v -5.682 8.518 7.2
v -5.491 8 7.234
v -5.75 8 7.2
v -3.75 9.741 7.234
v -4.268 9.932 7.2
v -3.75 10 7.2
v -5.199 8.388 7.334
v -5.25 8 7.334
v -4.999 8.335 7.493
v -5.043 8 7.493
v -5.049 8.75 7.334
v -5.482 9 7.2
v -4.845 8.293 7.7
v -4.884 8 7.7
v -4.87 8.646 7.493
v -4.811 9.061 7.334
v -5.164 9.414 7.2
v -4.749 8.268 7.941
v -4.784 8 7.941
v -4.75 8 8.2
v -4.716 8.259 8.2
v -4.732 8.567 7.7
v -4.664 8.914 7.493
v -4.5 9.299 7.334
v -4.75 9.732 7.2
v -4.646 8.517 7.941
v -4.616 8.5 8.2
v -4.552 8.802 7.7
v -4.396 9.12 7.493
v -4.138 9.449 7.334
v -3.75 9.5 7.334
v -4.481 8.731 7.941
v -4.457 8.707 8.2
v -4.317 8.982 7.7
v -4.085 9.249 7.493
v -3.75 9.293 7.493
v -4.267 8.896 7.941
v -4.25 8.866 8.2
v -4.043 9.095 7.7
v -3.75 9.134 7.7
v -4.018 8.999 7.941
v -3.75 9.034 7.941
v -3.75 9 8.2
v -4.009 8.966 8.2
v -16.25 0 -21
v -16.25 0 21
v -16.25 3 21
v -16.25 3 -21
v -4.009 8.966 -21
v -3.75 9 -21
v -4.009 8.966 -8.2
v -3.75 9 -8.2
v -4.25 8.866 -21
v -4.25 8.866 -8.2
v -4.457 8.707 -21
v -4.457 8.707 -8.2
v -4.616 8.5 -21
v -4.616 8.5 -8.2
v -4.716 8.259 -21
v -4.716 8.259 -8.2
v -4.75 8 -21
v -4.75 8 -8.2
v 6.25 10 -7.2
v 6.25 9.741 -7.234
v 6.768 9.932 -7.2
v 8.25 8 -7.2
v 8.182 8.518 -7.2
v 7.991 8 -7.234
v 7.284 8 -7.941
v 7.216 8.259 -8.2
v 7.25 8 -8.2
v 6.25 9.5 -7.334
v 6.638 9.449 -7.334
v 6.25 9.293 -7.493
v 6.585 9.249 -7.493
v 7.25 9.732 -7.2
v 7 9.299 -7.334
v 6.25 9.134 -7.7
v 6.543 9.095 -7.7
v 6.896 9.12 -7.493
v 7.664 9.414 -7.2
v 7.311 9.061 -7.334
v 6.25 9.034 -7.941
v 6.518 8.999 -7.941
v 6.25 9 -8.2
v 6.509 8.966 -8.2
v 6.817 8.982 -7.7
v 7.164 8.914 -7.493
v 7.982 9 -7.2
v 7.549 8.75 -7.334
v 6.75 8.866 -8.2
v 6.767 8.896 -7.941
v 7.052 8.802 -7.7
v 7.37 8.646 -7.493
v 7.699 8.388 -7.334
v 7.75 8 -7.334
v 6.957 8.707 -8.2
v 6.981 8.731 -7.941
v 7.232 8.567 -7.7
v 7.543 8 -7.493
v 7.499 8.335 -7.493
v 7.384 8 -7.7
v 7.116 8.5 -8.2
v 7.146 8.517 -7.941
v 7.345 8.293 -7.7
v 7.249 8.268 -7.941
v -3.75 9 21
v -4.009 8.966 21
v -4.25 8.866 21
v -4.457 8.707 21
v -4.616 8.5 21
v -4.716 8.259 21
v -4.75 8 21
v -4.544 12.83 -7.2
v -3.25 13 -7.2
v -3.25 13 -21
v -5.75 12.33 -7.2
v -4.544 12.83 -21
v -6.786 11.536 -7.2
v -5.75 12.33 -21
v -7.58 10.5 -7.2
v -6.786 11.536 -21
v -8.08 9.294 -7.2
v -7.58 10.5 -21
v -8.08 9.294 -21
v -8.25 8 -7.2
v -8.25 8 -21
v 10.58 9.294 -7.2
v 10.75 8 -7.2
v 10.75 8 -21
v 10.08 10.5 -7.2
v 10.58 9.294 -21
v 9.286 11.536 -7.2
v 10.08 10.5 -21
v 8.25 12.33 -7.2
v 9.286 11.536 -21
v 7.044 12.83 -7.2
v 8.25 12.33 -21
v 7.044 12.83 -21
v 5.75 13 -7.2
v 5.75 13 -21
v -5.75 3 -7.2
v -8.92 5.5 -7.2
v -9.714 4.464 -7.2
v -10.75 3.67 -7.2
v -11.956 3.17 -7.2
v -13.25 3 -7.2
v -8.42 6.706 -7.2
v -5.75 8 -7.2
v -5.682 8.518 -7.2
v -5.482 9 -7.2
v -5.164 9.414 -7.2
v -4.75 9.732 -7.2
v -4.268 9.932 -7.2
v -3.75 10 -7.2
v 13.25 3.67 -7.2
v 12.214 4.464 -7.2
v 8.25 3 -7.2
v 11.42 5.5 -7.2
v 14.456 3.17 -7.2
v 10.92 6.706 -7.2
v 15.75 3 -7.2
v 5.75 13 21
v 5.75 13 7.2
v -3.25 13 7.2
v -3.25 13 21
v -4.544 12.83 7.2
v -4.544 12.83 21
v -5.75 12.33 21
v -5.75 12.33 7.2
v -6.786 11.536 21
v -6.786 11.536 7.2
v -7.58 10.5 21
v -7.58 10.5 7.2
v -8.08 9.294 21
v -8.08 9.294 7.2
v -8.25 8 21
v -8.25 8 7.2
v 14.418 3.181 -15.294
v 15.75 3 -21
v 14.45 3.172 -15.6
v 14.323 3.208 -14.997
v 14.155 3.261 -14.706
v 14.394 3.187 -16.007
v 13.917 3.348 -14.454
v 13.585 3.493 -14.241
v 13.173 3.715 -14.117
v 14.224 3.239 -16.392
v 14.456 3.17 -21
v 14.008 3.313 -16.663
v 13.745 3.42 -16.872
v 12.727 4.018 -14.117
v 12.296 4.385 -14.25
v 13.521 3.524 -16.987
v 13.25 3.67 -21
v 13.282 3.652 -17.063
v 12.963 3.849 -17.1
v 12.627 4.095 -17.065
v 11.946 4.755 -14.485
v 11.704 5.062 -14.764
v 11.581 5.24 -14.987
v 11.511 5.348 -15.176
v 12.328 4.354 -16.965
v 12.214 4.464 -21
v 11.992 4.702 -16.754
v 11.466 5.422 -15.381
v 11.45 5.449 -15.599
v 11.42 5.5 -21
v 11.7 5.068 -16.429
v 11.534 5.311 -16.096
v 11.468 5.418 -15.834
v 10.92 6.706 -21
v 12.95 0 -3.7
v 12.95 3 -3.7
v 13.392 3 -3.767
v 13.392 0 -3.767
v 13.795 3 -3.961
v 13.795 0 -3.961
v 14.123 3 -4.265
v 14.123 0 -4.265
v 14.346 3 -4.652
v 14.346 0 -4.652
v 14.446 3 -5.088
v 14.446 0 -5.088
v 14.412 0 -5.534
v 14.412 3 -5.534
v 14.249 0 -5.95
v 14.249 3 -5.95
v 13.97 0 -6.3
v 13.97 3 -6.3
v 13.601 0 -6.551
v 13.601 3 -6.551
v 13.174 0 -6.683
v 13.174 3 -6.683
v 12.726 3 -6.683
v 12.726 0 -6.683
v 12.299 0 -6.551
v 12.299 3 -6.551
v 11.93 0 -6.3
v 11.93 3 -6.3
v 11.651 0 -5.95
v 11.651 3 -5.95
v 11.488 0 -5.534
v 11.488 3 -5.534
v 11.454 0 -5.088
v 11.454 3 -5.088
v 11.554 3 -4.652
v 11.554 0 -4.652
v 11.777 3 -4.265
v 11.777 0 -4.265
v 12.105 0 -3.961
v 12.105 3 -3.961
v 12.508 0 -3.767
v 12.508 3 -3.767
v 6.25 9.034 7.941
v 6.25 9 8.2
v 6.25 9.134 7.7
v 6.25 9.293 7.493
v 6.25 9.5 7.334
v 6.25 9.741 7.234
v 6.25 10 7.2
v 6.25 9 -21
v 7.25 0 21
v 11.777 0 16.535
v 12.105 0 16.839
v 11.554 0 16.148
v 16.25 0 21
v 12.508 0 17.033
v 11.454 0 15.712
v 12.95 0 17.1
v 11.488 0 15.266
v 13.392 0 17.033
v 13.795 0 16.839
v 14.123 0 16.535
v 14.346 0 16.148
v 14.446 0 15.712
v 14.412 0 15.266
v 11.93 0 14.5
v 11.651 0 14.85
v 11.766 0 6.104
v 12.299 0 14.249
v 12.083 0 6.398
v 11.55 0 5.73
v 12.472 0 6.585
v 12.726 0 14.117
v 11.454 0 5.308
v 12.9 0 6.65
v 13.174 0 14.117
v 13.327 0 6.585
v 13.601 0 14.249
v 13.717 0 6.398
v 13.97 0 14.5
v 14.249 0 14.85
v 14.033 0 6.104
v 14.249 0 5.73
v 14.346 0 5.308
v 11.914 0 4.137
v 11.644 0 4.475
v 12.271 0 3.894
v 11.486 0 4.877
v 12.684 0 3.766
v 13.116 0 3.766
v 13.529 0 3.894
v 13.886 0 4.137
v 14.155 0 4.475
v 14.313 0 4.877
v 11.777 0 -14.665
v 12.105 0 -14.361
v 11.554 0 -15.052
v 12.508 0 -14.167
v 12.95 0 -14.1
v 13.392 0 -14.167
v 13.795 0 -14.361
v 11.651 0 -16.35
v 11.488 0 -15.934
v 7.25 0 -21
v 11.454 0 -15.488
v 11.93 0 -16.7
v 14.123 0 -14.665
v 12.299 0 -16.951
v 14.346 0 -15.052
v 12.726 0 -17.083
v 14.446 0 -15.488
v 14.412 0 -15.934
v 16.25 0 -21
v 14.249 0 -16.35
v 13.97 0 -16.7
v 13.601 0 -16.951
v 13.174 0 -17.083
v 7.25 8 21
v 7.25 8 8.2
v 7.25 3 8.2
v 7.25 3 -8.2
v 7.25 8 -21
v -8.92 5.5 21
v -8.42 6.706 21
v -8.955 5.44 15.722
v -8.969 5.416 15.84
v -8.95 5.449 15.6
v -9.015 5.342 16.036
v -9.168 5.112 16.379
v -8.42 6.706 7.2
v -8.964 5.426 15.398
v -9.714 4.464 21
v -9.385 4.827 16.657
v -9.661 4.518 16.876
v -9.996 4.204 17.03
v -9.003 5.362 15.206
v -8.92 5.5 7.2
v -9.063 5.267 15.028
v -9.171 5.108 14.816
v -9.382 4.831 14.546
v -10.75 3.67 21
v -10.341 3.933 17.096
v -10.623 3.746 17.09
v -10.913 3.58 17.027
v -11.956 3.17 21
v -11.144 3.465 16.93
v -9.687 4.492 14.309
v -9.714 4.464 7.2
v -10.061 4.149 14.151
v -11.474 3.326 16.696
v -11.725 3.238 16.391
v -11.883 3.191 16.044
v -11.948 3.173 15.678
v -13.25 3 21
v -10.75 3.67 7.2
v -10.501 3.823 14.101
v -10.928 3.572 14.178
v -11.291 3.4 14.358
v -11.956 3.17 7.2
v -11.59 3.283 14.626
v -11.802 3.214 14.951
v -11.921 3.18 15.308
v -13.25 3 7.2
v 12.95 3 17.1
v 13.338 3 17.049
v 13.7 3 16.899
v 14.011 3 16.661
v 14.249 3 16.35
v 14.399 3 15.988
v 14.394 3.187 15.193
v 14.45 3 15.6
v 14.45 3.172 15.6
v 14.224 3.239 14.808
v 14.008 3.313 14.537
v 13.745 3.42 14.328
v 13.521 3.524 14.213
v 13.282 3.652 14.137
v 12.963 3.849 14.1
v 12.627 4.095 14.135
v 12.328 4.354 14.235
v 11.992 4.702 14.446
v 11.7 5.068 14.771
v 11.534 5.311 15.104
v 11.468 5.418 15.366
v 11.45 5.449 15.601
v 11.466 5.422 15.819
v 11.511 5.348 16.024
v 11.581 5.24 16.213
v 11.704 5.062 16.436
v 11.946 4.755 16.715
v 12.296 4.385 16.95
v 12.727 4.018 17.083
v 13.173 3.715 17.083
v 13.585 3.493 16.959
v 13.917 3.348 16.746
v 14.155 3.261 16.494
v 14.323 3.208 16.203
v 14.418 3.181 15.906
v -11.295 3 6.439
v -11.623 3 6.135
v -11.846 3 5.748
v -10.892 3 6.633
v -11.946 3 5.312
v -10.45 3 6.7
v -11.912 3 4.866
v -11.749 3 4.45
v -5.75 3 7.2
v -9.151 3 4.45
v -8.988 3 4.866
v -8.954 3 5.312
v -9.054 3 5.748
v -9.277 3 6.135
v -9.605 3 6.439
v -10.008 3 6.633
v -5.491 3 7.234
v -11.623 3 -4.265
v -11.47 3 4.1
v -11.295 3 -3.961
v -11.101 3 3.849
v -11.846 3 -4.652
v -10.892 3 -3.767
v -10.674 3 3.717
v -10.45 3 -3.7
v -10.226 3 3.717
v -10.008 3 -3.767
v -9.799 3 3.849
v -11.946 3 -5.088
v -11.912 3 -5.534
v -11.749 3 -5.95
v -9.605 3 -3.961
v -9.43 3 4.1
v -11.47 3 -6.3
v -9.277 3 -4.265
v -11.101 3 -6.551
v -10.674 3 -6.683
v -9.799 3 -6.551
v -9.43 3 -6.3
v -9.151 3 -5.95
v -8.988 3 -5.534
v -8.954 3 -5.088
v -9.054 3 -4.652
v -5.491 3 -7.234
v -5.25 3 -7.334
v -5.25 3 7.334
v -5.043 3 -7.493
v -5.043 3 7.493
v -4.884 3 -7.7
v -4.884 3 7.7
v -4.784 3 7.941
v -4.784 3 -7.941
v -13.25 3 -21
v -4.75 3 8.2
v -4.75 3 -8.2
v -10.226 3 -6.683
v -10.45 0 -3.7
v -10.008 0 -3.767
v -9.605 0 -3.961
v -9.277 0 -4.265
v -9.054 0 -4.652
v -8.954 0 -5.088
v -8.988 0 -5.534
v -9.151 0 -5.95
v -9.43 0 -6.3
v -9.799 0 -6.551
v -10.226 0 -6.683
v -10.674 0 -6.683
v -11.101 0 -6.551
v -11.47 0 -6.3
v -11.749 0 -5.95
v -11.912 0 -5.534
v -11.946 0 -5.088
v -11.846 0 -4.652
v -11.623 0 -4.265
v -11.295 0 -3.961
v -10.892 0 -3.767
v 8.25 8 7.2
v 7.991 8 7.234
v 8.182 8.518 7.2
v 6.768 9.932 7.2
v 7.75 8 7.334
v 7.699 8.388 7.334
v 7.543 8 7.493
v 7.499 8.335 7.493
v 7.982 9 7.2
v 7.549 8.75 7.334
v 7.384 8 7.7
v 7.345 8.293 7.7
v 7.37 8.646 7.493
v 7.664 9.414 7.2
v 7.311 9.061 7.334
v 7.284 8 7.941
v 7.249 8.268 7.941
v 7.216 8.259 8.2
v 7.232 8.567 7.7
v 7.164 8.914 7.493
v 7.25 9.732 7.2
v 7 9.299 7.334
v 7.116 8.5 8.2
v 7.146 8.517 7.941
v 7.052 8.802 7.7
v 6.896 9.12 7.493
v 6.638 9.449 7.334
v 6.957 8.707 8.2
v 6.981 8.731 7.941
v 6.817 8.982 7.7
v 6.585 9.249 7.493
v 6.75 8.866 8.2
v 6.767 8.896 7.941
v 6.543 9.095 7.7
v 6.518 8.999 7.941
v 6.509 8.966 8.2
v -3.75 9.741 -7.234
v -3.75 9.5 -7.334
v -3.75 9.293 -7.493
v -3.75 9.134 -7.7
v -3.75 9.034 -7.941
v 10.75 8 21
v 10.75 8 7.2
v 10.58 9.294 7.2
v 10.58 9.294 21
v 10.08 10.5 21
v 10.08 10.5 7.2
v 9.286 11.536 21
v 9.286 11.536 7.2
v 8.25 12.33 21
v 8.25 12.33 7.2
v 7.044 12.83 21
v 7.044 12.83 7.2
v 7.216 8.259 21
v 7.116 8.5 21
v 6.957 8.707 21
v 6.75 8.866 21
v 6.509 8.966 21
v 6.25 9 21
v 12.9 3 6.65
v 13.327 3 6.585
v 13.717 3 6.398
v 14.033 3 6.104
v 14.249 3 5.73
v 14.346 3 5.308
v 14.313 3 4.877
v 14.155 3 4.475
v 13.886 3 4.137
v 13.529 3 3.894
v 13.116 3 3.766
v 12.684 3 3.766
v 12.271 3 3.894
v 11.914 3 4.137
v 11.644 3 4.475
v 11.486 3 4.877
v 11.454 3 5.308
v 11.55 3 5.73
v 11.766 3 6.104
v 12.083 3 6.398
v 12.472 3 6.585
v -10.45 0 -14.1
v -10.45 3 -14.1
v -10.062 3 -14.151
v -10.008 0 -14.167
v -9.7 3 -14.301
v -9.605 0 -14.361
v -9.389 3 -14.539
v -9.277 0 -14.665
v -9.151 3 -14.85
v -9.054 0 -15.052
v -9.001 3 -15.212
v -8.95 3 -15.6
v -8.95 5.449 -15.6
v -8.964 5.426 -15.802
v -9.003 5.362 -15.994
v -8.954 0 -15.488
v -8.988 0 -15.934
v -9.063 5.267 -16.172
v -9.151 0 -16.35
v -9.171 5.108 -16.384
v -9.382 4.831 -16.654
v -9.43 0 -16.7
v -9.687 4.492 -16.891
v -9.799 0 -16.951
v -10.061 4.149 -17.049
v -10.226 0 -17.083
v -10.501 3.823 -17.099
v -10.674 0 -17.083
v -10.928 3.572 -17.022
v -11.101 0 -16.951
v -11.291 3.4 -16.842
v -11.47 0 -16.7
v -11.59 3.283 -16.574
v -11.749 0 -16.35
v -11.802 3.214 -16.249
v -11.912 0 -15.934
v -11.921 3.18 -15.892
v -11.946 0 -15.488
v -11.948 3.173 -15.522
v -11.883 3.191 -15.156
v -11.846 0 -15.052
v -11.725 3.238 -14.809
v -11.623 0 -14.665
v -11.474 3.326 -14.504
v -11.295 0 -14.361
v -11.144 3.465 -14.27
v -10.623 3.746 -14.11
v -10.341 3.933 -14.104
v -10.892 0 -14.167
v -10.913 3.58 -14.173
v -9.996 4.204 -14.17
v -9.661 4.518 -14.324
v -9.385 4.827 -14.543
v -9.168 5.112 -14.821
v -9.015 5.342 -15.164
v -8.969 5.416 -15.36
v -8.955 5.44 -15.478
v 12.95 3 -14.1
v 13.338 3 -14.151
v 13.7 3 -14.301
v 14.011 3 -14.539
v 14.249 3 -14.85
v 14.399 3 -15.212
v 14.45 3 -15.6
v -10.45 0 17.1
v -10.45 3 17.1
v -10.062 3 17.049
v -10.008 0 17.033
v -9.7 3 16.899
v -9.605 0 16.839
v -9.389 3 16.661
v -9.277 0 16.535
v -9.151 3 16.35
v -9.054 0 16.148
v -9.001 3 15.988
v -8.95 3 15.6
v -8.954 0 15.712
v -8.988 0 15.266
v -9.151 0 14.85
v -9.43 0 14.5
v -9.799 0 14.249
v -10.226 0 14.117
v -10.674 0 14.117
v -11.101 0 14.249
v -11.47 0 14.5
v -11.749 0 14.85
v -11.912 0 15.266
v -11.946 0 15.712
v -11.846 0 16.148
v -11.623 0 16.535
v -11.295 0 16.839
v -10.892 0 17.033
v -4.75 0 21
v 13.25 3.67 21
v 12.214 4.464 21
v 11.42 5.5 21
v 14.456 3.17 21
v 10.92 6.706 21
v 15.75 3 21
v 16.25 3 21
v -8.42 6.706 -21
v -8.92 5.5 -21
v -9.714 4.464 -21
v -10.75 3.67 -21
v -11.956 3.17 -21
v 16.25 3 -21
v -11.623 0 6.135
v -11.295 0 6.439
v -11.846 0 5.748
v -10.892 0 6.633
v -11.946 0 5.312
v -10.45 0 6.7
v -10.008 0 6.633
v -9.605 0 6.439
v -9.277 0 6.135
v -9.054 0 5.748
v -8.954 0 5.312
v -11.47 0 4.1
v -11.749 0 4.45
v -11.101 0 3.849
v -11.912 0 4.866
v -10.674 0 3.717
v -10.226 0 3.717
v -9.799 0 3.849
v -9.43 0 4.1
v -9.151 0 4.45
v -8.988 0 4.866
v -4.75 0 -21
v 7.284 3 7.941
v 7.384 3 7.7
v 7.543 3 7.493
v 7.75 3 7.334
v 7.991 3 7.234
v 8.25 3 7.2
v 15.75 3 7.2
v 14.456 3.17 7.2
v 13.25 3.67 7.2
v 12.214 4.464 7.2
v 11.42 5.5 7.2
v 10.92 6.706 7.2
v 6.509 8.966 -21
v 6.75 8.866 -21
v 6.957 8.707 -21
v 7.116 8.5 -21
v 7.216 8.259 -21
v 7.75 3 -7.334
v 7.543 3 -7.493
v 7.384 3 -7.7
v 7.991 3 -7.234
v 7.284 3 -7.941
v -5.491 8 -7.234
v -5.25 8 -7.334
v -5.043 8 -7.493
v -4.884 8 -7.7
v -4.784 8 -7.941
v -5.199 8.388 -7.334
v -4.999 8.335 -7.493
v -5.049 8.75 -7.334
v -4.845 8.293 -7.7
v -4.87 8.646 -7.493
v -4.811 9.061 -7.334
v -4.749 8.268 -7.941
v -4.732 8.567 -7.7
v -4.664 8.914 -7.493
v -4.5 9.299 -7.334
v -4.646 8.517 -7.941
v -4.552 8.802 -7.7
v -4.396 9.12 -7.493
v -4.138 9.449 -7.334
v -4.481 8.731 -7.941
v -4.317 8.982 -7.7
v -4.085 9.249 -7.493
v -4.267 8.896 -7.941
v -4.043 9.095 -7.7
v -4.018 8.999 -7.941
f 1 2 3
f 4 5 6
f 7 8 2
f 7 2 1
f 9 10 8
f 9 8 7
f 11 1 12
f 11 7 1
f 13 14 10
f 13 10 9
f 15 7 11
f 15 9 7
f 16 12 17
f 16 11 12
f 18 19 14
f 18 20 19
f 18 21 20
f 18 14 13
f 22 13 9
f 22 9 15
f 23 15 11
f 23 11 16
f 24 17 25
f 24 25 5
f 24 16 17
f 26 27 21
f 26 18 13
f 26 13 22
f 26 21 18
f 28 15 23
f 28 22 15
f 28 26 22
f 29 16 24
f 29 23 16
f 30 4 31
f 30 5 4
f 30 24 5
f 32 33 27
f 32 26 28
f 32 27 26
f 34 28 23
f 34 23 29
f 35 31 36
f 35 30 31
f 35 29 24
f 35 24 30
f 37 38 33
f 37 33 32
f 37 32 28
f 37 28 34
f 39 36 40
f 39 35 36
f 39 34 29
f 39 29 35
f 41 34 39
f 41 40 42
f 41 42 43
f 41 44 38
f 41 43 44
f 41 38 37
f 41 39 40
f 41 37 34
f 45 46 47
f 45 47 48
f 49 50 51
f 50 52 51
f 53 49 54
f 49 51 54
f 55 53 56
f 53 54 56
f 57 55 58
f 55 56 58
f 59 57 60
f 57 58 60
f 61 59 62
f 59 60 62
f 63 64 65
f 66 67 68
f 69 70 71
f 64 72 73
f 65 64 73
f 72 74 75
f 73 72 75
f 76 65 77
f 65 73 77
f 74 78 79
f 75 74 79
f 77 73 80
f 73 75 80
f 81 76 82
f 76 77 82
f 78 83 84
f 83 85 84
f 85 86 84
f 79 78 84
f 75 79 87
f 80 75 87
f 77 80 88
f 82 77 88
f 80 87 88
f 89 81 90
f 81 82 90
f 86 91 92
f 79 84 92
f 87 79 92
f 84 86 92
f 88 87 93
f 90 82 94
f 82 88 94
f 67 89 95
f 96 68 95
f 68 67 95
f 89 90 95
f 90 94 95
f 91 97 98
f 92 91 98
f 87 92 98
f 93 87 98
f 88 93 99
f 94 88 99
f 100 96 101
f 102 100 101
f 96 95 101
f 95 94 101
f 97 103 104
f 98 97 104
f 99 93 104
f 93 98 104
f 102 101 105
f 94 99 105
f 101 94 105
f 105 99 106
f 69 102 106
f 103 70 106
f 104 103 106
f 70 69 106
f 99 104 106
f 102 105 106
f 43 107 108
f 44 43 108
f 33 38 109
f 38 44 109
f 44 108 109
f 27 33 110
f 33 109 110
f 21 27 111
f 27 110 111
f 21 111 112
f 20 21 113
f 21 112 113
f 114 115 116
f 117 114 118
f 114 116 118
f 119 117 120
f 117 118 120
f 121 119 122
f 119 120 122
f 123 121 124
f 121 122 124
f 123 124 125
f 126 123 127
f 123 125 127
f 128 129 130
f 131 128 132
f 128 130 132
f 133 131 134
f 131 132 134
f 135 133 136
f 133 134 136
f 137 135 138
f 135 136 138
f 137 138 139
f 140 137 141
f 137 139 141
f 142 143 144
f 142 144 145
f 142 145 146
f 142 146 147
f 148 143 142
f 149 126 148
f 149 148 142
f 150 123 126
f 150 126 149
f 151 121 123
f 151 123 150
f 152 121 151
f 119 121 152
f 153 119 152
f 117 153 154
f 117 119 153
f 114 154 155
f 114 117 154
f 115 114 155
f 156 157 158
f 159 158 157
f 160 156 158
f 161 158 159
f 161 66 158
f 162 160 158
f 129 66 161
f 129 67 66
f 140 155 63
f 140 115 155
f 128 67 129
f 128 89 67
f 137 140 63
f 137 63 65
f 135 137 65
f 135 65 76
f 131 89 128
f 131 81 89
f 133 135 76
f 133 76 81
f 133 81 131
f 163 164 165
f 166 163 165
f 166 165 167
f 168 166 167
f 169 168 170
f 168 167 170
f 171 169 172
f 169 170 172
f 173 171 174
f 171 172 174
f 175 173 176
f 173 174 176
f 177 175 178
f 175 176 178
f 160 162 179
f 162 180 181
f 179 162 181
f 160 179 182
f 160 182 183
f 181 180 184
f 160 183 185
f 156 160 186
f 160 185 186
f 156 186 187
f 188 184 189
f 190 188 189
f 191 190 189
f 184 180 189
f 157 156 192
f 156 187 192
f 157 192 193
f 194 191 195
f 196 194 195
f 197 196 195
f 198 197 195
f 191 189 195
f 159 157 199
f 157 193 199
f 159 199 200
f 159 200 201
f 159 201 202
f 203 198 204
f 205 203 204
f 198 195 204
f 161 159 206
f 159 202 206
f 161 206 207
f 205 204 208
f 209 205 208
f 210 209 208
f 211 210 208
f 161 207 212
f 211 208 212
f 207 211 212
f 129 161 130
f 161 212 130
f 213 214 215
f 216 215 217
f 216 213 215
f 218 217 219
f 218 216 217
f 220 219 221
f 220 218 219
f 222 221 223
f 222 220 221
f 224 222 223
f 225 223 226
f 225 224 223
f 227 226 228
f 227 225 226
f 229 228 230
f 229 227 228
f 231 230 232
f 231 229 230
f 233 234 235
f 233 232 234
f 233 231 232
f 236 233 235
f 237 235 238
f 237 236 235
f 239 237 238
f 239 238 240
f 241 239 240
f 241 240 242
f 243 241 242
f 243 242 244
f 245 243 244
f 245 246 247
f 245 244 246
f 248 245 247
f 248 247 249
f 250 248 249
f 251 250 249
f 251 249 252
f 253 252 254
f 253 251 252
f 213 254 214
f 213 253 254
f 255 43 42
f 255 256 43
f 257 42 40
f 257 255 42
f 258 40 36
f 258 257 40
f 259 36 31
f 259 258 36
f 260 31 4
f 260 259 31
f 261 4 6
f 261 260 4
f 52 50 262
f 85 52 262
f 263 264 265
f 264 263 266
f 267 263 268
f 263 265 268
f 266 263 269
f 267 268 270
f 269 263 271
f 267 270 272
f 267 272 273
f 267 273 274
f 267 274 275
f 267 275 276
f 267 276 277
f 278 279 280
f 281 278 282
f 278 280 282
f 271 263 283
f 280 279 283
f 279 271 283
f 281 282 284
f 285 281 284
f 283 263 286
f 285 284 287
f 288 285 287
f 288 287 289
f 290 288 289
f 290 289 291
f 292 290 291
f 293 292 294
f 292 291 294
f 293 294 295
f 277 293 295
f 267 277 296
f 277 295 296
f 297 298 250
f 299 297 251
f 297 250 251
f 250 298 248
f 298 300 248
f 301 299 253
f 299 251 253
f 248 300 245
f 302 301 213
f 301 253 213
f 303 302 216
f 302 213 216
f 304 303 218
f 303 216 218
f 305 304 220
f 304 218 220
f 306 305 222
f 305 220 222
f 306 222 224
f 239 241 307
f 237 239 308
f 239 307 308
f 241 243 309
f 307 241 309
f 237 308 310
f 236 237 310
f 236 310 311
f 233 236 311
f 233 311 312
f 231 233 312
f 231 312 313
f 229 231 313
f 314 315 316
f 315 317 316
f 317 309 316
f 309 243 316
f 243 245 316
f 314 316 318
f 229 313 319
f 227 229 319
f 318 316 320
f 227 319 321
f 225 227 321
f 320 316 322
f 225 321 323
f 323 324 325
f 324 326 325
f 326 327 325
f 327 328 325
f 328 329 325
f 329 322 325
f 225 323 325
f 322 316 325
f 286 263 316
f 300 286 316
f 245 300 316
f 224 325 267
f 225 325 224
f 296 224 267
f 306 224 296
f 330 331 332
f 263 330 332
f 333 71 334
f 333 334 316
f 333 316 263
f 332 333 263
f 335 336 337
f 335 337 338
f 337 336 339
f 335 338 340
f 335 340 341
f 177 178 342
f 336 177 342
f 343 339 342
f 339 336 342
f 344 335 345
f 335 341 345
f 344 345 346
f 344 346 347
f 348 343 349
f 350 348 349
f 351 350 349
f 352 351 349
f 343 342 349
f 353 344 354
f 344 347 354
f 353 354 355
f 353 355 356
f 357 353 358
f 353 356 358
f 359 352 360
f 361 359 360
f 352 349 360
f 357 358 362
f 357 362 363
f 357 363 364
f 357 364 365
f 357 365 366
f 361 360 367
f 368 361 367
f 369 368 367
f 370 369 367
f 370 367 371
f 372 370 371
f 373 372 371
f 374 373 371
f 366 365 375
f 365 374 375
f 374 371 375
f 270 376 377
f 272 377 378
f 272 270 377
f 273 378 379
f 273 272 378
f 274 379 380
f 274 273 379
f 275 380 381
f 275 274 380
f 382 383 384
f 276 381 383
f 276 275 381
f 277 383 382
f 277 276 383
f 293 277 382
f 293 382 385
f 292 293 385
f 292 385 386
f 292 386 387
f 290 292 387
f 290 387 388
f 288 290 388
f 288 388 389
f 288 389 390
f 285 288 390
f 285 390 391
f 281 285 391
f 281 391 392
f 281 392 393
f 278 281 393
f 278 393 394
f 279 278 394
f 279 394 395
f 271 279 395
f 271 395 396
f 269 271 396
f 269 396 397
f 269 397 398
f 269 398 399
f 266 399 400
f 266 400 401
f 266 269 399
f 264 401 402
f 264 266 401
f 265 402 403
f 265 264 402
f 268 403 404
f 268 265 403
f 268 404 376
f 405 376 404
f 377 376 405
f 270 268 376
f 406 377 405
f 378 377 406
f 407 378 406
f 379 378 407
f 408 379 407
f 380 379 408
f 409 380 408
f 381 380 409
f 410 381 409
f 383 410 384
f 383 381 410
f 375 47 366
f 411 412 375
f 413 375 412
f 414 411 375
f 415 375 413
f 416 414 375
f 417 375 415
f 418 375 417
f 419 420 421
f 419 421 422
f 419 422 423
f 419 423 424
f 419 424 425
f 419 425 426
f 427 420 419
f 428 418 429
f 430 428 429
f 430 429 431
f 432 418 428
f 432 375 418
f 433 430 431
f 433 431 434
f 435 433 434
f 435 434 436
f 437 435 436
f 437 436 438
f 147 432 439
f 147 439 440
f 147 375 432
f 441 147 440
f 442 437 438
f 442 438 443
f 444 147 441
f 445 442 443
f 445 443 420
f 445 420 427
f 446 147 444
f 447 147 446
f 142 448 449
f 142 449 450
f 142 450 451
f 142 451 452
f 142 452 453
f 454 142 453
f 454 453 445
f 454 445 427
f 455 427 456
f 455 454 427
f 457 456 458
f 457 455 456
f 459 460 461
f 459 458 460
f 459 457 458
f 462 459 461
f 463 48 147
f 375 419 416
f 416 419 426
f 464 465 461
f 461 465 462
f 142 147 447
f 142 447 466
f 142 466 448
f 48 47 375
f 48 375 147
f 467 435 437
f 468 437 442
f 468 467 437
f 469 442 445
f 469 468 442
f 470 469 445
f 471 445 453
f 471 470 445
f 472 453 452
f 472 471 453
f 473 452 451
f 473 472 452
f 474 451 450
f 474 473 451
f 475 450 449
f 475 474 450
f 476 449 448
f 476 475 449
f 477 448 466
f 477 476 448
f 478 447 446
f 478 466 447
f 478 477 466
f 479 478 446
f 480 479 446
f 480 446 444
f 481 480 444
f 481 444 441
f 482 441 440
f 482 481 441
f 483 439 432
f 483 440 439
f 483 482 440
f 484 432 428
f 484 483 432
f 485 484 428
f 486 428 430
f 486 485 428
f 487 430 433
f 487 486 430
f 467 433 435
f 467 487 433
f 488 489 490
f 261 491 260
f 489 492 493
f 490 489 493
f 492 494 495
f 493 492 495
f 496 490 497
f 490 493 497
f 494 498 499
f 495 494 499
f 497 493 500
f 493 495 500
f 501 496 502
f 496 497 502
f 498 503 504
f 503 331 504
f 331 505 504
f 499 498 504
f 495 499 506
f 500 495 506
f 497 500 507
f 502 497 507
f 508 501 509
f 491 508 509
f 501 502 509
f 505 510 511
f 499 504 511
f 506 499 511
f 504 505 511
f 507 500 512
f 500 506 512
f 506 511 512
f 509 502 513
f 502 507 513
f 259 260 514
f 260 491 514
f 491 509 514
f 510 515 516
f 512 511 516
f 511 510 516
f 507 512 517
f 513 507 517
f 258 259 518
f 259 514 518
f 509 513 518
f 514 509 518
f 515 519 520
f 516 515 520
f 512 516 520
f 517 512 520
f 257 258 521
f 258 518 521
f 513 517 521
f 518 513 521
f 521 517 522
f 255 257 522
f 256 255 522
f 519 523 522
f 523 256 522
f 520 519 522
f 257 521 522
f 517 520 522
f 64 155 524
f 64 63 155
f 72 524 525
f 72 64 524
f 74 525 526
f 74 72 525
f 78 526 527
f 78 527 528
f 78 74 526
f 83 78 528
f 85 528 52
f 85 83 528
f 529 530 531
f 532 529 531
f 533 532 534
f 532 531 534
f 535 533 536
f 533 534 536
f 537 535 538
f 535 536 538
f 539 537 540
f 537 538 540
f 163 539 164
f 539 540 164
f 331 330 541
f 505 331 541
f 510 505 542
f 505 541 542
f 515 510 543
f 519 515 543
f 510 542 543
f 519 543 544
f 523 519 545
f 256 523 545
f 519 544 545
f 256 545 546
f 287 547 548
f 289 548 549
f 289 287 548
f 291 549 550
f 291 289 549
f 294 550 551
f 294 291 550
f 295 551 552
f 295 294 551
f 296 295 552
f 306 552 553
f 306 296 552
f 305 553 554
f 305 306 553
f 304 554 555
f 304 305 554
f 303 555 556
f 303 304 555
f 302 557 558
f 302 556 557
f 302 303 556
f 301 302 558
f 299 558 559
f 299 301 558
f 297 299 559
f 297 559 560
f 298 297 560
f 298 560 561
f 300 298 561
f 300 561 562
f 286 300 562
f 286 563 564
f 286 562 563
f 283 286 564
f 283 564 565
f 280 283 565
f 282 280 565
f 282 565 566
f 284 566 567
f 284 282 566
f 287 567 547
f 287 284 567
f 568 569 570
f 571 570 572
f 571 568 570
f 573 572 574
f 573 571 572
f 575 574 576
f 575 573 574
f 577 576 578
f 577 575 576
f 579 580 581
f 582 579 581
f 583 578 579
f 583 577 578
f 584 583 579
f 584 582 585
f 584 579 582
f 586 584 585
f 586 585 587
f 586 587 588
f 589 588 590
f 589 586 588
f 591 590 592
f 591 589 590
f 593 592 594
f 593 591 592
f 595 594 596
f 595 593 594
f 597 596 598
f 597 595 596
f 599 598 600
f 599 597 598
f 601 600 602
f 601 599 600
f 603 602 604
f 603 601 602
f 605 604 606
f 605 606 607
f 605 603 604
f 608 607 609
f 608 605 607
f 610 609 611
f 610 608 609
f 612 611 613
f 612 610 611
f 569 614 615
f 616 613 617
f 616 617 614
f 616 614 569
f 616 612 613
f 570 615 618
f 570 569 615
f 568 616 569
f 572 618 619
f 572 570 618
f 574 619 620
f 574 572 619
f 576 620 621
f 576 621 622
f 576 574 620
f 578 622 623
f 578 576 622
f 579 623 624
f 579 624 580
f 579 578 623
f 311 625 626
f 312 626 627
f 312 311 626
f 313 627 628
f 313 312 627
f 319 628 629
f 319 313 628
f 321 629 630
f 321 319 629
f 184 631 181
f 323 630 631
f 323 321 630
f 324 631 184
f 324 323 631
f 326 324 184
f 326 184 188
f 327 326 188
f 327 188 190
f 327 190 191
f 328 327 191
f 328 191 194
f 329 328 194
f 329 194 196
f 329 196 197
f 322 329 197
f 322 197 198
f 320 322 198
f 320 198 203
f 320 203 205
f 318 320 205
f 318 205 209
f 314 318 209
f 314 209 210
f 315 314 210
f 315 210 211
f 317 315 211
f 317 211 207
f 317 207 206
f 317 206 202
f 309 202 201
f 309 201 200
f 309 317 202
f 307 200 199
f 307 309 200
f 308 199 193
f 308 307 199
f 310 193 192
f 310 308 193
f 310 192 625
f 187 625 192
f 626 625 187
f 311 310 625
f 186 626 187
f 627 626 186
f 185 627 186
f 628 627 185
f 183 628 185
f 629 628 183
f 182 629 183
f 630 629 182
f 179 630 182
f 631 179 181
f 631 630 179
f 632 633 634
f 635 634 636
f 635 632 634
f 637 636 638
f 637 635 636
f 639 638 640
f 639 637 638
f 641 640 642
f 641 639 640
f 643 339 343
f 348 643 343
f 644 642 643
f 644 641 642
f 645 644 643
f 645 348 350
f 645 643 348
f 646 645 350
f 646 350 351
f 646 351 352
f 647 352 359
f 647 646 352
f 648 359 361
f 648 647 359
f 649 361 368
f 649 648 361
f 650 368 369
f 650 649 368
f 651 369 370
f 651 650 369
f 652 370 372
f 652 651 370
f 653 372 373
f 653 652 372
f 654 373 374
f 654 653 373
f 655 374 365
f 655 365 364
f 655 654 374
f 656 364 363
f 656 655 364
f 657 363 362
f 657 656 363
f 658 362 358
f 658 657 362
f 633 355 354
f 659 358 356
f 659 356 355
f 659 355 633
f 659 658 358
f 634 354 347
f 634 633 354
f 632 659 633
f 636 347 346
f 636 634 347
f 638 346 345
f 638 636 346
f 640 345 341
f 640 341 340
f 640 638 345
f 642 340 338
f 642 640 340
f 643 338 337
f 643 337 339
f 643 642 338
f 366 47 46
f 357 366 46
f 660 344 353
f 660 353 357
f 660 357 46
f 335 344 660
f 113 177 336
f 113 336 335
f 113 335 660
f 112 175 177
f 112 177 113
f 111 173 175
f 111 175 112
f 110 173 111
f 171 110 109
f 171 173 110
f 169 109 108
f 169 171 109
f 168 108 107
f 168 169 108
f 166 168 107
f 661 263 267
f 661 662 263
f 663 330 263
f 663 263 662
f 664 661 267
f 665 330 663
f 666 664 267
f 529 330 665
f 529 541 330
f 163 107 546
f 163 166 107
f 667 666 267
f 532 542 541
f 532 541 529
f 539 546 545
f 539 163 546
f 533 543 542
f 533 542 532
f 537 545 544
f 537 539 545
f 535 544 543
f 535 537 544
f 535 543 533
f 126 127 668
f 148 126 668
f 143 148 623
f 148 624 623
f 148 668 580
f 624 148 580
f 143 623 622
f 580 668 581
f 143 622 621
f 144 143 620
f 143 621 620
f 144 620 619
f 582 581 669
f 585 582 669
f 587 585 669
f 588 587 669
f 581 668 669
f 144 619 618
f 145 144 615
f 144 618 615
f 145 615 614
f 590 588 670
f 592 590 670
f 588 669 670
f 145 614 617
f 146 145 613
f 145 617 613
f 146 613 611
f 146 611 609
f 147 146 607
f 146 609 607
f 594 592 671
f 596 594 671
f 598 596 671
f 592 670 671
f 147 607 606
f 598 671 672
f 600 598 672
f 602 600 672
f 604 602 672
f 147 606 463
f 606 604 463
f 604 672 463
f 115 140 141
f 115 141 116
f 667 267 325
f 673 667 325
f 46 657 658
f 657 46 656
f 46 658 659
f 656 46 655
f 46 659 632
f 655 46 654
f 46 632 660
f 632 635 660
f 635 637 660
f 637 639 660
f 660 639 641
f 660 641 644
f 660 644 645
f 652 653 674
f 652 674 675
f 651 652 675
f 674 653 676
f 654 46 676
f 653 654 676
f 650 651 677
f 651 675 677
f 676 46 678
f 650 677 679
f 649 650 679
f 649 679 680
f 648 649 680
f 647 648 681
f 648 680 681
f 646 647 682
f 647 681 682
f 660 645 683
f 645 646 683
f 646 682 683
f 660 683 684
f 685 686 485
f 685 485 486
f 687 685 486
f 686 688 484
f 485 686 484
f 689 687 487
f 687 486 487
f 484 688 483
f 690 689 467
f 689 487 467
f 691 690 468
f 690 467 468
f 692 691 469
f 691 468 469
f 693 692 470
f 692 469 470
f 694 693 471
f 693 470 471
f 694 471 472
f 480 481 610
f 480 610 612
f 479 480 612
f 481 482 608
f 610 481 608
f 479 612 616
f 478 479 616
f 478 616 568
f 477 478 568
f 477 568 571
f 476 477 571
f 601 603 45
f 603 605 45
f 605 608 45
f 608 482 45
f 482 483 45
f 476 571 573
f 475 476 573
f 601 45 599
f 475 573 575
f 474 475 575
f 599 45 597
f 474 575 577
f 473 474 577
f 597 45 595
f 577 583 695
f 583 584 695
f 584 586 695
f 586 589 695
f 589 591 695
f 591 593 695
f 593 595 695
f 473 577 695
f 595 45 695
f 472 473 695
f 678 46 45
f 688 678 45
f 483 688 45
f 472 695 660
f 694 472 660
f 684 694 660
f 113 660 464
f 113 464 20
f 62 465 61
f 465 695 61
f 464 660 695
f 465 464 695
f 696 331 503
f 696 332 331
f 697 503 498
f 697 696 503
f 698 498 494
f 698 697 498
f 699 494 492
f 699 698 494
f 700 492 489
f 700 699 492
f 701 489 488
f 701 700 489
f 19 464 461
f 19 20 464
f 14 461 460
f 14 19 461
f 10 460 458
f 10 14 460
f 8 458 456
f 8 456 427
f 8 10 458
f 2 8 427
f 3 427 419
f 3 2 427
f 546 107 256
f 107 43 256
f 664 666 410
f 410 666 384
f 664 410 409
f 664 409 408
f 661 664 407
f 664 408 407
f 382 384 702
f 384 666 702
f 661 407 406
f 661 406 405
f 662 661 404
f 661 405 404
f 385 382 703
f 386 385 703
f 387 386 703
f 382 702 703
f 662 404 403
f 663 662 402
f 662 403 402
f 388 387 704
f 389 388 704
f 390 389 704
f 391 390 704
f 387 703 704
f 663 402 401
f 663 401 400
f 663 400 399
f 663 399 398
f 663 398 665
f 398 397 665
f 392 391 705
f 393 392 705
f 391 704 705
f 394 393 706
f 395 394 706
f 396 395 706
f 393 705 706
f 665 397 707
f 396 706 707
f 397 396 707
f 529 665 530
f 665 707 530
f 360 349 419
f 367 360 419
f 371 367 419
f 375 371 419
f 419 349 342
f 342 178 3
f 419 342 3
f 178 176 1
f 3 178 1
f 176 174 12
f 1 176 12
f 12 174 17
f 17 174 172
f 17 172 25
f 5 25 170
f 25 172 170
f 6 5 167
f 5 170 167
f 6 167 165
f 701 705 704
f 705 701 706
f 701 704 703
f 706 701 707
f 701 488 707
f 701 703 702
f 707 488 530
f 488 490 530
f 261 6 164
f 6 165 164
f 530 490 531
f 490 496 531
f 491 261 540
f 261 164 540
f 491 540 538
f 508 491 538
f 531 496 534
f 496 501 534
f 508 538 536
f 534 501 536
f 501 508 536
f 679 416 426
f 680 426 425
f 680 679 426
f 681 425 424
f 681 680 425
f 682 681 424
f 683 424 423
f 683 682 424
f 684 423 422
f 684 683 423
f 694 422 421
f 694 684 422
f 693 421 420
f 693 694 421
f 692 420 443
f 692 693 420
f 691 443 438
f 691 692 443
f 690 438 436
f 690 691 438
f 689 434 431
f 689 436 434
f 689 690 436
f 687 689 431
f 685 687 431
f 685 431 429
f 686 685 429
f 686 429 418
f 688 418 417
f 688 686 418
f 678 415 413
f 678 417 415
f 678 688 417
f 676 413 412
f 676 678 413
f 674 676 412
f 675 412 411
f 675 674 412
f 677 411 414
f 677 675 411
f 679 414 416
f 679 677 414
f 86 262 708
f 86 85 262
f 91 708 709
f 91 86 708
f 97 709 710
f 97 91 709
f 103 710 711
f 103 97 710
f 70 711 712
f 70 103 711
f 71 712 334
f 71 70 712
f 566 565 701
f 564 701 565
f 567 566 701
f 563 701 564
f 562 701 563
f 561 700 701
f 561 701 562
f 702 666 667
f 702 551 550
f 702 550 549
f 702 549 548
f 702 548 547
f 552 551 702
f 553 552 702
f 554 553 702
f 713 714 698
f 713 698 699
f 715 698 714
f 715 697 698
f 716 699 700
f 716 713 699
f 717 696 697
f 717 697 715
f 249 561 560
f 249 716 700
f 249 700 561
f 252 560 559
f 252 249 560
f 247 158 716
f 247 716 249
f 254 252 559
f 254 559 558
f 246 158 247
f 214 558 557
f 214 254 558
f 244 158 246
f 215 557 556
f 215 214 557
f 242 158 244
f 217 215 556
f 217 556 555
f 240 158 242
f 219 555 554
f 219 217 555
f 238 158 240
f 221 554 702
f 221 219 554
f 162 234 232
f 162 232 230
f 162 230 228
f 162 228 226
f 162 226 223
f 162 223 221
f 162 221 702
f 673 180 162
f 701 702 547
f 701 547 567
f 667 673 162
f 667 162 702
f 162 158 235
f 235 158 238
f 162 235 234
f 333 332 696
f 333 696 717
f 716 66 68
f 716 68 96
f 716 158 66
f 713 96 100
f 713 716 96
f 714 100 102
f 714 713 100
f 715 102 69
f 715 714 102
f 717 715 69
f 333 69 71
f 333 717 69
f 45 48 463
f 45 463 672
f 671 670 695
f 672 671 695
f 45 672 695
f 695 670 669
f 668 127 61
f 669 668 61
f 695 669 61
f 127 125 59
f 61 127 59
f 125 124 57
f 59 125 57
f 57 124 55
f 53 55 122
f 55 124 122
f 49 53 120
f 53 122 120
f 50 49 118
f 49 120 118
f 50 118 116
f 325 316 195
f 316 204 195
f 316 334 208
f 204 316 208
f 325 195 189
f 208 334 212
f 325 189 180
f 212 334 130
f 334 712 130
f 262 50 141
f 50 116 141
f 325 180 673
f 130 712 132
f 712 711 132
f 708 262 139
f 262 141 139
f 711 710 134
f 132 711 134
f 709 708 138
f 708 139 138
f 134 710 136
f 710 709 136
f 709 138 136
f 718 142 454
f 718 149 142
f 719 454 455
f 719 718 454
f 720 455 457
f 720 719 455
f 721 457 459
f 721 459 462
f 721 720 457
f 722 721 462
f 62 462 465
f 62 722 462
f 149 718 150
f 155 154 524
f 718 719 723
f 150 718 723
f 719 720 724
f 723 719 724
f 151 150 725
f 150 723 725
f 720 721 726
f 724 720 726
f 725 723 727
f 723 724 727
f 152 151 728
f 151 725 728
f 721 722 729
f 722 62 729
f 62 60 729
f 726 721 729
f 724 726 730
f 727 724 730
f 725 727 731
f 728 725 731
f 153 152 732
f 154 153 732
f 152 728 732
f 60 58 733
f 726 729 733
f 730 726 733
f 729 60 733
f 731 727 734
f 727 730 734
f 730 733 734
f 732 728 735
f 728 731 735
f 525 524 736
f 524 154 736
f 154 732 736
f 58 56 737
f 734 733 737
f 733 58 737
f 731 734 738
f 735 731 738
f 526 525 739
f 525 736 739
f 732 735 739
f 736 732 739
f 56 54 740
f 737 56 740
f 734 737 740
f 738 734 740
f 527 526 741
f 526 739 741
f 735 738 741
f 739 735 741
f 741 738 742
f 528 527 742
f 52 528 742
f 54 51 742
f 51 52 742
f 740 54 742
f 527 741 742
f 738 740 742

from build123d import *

# Parameters (mm, degrees)
SKETCH_2_W             = 32.5
SKETCH_2_H             = 42
SKETCH_2_R             = 1.5
SKETCH_2_R_2           = 1.449840903
EXTRUDE_1_DEPTH        = 3
SKETCH_4_W             = 12
SKETCH_4_H             = 42
CUT_EXTRUDE_1_DEPTH    = 22
EXTRUDE_2_DEPTH        = 42
FILLET_START           = 8
FILLET_1_OUTLINE_W     = 19
FILLET_1_OUTLINE_H     = 42
FILLET_1_DEPTH         = 5
FILLET_START_2         = -21
FILLET_1_2_DEPTH       = 42
FILLET_START_3         = 3
FILLET_1_3_OUTLINE_R   = 1.5
FILLET_1_3_OUTLINE_R_2 = 1.449840903
FILLET_1_3_DEPTH       = 5
CUT_EXTRUDE_2_REACH    = 31.565
SKETCH_6_W             = 36.57681216
SKETCH_6_H             = 14.4
FILLET_2_R             = 1


with BuildPart() as part:
    # Эскиз2 → Бобышка-Вытянуть1 (new body)
    with BuildSketch(Plane(origin=(0, 0, 0), x_dir=(1, 0, 0), z_dir=(0, 1, 0))):
        Rectangle(SKETCH_2_W, SKETCH_2_H)
        with Locations(Location((-10.45, -15.6, 0), (0, 0, 270))):
            Circle(SKETCH_2_R, mode=Mode.SUBTRACT)
        with Locations(Location((-10.45, -5.2, 0), (0, 0, 270))):
            Circle(SKETCH_2_R, mode=Mode.SUBTRACT)
        with Locations(Location((-10.45, 5.2, 0), (0, 0, 270))):
            Circle(SKETCH_2_R, mode=Mode.SUBTRACT)
        with Locations(Location((-10.45, 15.6, 0), (0, 0, 270))):
            Circle(SKETCH_2_R, mode=Mode.SUBTRACT)
        with Locations(Location((12.95, 15.6, 0), (0, 0, 270))):
            Circle(SKETCH_2_R, mode=Mode.SUBTRACT)
        with Locations(Location((12.95, 5.2, 0), (0, 0, 270))):
            Circle(SKETCH_2_R, mode=Mode.SUBTRACT)
        with Locations(Location((12.899840903, -5.2, 0), (0, 0, 270))):
            Circle(SKETCH_2_R_2, mode=Mode.SUBTRACT)
        with Locations(Location((12.95, -15.6, 0), (0, 0, 270))):
            Circle(SKETCH_2_R, mode=Mode.SUBTRACT)
    extrude(amount=EXTRUDE_1_DEPTH)

    # Эскиз4 → Вырез-Вытянуть1 (cut)
    with BuildSketch(Plane(origin=(0, 3, 0), x_dir=(1, 0, 0), z_dir=(0, 1, 0))):
        with Locations((1.25, 0)):
            Rectangle(SKETCH_4_W, SKETCH_4_H)
    extrude(amount=-CUT_EXTRUDE_1_DEPTH, mode=Mode.SUBTRACT)


with BuildPart() as cut_extrude_1_piece_1:
    # of the separate pieces the step leaves, piece 1, a body of its own (cut_extrude_1_pieces)
    add(part.part.solids().sort_by_distance((-16.25, 0, 21))[0])



with BuildPart() as cut_extrude_1_piece_2:
    # of the separate pieces the step leaves, piece 2, a body of its own (cut_extrude_1_pieces)
    add(part.part.solids().sort_by_distance((7.25, 0, 21))[0])


with BuildPart() as cut_extrude_1_piece_1_1:
    add(cut_extrude_1_piece_1.part)

    add(cut_extrude_1_piece_2.part)  # Бобышка-Вытянуть2 merges Вырез-Вытянуть1 piece 2
    # Эскиз5 → Бобышка-Вытянуть2 (add)
    with BuildSketch(Plane.XY.offset(21)):
        Polygon((-4.75, 0), (-4.75, 3), (-4.75, 9), (7.25, 9), (7.25, 3), (7.25, 0), (10.75, 0), (10.75, 13), (-8.25, 13), (-8.25, 0), align=None)
    extrude(amount=-EXTRUDE_2_DEPTH)

    # Скругление1: read off the stored shape, not the designer's step
    # Скругление1 outline → Скругление1 (cut)
    with BuildSketch(Plane(origin=(0, 0, 0), x_dir=(1, 0, 0), z_dir=(0, 1, 0)).offset(FILLET_START)):
        with Locations((1.25, 0)):
            Rectangle(FILLET_1_OUTLINE_W, FILLET_1_OUTLINE_H)
    extrude(amount=FILLET_1_DEPTH, mode=Mode.SUBTRACT)

    # Fillet 1 2 outline → Fillet 1 2 (add)
    with BuildSketch(Plane.XY.offset(FILLET_START_2)):
        with BuildLine():
            Line((-8.25, 3), (-8.25, 8))
            ThreePointArc((-8.25, 8), (-9.714466094, 4.464466094), (-13.25, 3))
            Line((-13.25, 3), (-8.25, 3))
        make_face()
        with BuildLine():
            ThreePointArc((15.75, 3), (12.214466094, 4.464466094), (10.75, 8))
            Line((10.75, 8), (10.75, 3))
            Line((10.75, 3), (15.75, 3))
        make_face()
        with BuildLine():
            Line((-4.75, 8), (-4.75, 9))
            Line((-4.75, 9), (7.25, 9))
            Line((7.25, 9), (7.25, 8))
            Line((7.25, 8), (10.75, 8))
            ThreePointArc((10.75, 8), (9.285533906, 11.535533906), (5.75, 13))
            Line((5.75, 13), (-3.25, 13))
            ThreePointArc((-3.25, 13), (-6.785533906, 11.535533906), (-8.25, 8))
            Line((-8.25, 8), (-4.75, 8))
        make_face()
    extrude(amount=FILLET_1_2_DEPTH)

    # Fillet 1 3 outline → Fillet 1 3 (cut)
    with BuildSketch(Plane(origin=(0, 0, 0), x_dir=(1, 0, 0), z_dir=(0, 1, 0)).offset(FILLET_START_3)):
        with Locations((-10.45, -15.6)):
            Circle(FILLET_1_3_OUTLINE_R)
        with Locations((-10.45, -5.2)):
            Circle(FILLET_1_3_OUTLINE_R)
        with Locations((-10.45, 5.2)):
            Circle(FILLET_1_3_OUTLINE_R)
        with Locations((-10.45, 15.6)):
            Circle(FILLET_1_3_OUTLINE_R)
        with Locations((12.899840903, -5.2)):
            Circle(FILLET_1_3_OUTLINE_R_2)
        with Locations((12.95, 15.6)):
            Circle(FILLET_1_3_OUTLINE_R)
        with Locations((12.95, 5.2)):
            Circle(FILLET_1_3_OUTLINE_R)
        with Locations((12.95, -15.6)):
            Circle(FILLET_1_3_OUTLINE_R)
    extrude(amount=FILLET_1_3_DEPTH, mode=Mode.SUBTRACT)

    # Вырез-Вытянуть2: up to this face of the body (flat: up to its plane)
    cut_extrude_2_end = Plane(cut_extrude_1_piece_1_1.part.faces().sort_by_distance((16, 3, 0))[0])
    # Эскиз6 → Вырез-Вытянуть2 (cut, up to the picked face)
    with BuildSketch(Plane(origin=(0, 13, 0), x_dir=(1, 0, 0), z_dir=(0, 1, 0)), mode=Mode.PRIVATE) as cut_extrude_2_sk1:
        Rectangle(SKETCH_6_W, SKETCH_6_H)
    cut_extrude_2_tool1 = split(extrude(cut_extrude_2_sk1.sketch, amount=-CUT_EXTRUDE_2_REACH, mode=Mode.PRIVATE), bisect_by=cut_extrude_2_end, keep=Keep.BOTH, mode=Mode.PRIVATE)
    add(cut_extrude_2_tool1.solids().sort_by(Axis((0, 13, 0), (0, -1, 0)))[0], mode=Mode.SUBTRACT)

    # Скругление2
    fillet_2_edges = [cut_extrude_1_piece_1_1.edges().sort_by_distance(p)[0] for p in [
        (7.25, 9, 14.1),
        (-4.75, 9, 14.1),
        (-4.75, 6, -7.2),
        (1.25, 9, -7.2),
        (7.25, 6, -7.2),
        (-4.75, 6, 7.2),
        (7.25, 6, 7.2),
        (1.25, 9, 7.2),
        (-4.75, 9, -14.1),
        (7.25, 9, -14.1),
    ]]
    fillet(fillet_2_edges, radius=FILLET_2_R)


solid = cut_extrude_1_piece_1_1.part
